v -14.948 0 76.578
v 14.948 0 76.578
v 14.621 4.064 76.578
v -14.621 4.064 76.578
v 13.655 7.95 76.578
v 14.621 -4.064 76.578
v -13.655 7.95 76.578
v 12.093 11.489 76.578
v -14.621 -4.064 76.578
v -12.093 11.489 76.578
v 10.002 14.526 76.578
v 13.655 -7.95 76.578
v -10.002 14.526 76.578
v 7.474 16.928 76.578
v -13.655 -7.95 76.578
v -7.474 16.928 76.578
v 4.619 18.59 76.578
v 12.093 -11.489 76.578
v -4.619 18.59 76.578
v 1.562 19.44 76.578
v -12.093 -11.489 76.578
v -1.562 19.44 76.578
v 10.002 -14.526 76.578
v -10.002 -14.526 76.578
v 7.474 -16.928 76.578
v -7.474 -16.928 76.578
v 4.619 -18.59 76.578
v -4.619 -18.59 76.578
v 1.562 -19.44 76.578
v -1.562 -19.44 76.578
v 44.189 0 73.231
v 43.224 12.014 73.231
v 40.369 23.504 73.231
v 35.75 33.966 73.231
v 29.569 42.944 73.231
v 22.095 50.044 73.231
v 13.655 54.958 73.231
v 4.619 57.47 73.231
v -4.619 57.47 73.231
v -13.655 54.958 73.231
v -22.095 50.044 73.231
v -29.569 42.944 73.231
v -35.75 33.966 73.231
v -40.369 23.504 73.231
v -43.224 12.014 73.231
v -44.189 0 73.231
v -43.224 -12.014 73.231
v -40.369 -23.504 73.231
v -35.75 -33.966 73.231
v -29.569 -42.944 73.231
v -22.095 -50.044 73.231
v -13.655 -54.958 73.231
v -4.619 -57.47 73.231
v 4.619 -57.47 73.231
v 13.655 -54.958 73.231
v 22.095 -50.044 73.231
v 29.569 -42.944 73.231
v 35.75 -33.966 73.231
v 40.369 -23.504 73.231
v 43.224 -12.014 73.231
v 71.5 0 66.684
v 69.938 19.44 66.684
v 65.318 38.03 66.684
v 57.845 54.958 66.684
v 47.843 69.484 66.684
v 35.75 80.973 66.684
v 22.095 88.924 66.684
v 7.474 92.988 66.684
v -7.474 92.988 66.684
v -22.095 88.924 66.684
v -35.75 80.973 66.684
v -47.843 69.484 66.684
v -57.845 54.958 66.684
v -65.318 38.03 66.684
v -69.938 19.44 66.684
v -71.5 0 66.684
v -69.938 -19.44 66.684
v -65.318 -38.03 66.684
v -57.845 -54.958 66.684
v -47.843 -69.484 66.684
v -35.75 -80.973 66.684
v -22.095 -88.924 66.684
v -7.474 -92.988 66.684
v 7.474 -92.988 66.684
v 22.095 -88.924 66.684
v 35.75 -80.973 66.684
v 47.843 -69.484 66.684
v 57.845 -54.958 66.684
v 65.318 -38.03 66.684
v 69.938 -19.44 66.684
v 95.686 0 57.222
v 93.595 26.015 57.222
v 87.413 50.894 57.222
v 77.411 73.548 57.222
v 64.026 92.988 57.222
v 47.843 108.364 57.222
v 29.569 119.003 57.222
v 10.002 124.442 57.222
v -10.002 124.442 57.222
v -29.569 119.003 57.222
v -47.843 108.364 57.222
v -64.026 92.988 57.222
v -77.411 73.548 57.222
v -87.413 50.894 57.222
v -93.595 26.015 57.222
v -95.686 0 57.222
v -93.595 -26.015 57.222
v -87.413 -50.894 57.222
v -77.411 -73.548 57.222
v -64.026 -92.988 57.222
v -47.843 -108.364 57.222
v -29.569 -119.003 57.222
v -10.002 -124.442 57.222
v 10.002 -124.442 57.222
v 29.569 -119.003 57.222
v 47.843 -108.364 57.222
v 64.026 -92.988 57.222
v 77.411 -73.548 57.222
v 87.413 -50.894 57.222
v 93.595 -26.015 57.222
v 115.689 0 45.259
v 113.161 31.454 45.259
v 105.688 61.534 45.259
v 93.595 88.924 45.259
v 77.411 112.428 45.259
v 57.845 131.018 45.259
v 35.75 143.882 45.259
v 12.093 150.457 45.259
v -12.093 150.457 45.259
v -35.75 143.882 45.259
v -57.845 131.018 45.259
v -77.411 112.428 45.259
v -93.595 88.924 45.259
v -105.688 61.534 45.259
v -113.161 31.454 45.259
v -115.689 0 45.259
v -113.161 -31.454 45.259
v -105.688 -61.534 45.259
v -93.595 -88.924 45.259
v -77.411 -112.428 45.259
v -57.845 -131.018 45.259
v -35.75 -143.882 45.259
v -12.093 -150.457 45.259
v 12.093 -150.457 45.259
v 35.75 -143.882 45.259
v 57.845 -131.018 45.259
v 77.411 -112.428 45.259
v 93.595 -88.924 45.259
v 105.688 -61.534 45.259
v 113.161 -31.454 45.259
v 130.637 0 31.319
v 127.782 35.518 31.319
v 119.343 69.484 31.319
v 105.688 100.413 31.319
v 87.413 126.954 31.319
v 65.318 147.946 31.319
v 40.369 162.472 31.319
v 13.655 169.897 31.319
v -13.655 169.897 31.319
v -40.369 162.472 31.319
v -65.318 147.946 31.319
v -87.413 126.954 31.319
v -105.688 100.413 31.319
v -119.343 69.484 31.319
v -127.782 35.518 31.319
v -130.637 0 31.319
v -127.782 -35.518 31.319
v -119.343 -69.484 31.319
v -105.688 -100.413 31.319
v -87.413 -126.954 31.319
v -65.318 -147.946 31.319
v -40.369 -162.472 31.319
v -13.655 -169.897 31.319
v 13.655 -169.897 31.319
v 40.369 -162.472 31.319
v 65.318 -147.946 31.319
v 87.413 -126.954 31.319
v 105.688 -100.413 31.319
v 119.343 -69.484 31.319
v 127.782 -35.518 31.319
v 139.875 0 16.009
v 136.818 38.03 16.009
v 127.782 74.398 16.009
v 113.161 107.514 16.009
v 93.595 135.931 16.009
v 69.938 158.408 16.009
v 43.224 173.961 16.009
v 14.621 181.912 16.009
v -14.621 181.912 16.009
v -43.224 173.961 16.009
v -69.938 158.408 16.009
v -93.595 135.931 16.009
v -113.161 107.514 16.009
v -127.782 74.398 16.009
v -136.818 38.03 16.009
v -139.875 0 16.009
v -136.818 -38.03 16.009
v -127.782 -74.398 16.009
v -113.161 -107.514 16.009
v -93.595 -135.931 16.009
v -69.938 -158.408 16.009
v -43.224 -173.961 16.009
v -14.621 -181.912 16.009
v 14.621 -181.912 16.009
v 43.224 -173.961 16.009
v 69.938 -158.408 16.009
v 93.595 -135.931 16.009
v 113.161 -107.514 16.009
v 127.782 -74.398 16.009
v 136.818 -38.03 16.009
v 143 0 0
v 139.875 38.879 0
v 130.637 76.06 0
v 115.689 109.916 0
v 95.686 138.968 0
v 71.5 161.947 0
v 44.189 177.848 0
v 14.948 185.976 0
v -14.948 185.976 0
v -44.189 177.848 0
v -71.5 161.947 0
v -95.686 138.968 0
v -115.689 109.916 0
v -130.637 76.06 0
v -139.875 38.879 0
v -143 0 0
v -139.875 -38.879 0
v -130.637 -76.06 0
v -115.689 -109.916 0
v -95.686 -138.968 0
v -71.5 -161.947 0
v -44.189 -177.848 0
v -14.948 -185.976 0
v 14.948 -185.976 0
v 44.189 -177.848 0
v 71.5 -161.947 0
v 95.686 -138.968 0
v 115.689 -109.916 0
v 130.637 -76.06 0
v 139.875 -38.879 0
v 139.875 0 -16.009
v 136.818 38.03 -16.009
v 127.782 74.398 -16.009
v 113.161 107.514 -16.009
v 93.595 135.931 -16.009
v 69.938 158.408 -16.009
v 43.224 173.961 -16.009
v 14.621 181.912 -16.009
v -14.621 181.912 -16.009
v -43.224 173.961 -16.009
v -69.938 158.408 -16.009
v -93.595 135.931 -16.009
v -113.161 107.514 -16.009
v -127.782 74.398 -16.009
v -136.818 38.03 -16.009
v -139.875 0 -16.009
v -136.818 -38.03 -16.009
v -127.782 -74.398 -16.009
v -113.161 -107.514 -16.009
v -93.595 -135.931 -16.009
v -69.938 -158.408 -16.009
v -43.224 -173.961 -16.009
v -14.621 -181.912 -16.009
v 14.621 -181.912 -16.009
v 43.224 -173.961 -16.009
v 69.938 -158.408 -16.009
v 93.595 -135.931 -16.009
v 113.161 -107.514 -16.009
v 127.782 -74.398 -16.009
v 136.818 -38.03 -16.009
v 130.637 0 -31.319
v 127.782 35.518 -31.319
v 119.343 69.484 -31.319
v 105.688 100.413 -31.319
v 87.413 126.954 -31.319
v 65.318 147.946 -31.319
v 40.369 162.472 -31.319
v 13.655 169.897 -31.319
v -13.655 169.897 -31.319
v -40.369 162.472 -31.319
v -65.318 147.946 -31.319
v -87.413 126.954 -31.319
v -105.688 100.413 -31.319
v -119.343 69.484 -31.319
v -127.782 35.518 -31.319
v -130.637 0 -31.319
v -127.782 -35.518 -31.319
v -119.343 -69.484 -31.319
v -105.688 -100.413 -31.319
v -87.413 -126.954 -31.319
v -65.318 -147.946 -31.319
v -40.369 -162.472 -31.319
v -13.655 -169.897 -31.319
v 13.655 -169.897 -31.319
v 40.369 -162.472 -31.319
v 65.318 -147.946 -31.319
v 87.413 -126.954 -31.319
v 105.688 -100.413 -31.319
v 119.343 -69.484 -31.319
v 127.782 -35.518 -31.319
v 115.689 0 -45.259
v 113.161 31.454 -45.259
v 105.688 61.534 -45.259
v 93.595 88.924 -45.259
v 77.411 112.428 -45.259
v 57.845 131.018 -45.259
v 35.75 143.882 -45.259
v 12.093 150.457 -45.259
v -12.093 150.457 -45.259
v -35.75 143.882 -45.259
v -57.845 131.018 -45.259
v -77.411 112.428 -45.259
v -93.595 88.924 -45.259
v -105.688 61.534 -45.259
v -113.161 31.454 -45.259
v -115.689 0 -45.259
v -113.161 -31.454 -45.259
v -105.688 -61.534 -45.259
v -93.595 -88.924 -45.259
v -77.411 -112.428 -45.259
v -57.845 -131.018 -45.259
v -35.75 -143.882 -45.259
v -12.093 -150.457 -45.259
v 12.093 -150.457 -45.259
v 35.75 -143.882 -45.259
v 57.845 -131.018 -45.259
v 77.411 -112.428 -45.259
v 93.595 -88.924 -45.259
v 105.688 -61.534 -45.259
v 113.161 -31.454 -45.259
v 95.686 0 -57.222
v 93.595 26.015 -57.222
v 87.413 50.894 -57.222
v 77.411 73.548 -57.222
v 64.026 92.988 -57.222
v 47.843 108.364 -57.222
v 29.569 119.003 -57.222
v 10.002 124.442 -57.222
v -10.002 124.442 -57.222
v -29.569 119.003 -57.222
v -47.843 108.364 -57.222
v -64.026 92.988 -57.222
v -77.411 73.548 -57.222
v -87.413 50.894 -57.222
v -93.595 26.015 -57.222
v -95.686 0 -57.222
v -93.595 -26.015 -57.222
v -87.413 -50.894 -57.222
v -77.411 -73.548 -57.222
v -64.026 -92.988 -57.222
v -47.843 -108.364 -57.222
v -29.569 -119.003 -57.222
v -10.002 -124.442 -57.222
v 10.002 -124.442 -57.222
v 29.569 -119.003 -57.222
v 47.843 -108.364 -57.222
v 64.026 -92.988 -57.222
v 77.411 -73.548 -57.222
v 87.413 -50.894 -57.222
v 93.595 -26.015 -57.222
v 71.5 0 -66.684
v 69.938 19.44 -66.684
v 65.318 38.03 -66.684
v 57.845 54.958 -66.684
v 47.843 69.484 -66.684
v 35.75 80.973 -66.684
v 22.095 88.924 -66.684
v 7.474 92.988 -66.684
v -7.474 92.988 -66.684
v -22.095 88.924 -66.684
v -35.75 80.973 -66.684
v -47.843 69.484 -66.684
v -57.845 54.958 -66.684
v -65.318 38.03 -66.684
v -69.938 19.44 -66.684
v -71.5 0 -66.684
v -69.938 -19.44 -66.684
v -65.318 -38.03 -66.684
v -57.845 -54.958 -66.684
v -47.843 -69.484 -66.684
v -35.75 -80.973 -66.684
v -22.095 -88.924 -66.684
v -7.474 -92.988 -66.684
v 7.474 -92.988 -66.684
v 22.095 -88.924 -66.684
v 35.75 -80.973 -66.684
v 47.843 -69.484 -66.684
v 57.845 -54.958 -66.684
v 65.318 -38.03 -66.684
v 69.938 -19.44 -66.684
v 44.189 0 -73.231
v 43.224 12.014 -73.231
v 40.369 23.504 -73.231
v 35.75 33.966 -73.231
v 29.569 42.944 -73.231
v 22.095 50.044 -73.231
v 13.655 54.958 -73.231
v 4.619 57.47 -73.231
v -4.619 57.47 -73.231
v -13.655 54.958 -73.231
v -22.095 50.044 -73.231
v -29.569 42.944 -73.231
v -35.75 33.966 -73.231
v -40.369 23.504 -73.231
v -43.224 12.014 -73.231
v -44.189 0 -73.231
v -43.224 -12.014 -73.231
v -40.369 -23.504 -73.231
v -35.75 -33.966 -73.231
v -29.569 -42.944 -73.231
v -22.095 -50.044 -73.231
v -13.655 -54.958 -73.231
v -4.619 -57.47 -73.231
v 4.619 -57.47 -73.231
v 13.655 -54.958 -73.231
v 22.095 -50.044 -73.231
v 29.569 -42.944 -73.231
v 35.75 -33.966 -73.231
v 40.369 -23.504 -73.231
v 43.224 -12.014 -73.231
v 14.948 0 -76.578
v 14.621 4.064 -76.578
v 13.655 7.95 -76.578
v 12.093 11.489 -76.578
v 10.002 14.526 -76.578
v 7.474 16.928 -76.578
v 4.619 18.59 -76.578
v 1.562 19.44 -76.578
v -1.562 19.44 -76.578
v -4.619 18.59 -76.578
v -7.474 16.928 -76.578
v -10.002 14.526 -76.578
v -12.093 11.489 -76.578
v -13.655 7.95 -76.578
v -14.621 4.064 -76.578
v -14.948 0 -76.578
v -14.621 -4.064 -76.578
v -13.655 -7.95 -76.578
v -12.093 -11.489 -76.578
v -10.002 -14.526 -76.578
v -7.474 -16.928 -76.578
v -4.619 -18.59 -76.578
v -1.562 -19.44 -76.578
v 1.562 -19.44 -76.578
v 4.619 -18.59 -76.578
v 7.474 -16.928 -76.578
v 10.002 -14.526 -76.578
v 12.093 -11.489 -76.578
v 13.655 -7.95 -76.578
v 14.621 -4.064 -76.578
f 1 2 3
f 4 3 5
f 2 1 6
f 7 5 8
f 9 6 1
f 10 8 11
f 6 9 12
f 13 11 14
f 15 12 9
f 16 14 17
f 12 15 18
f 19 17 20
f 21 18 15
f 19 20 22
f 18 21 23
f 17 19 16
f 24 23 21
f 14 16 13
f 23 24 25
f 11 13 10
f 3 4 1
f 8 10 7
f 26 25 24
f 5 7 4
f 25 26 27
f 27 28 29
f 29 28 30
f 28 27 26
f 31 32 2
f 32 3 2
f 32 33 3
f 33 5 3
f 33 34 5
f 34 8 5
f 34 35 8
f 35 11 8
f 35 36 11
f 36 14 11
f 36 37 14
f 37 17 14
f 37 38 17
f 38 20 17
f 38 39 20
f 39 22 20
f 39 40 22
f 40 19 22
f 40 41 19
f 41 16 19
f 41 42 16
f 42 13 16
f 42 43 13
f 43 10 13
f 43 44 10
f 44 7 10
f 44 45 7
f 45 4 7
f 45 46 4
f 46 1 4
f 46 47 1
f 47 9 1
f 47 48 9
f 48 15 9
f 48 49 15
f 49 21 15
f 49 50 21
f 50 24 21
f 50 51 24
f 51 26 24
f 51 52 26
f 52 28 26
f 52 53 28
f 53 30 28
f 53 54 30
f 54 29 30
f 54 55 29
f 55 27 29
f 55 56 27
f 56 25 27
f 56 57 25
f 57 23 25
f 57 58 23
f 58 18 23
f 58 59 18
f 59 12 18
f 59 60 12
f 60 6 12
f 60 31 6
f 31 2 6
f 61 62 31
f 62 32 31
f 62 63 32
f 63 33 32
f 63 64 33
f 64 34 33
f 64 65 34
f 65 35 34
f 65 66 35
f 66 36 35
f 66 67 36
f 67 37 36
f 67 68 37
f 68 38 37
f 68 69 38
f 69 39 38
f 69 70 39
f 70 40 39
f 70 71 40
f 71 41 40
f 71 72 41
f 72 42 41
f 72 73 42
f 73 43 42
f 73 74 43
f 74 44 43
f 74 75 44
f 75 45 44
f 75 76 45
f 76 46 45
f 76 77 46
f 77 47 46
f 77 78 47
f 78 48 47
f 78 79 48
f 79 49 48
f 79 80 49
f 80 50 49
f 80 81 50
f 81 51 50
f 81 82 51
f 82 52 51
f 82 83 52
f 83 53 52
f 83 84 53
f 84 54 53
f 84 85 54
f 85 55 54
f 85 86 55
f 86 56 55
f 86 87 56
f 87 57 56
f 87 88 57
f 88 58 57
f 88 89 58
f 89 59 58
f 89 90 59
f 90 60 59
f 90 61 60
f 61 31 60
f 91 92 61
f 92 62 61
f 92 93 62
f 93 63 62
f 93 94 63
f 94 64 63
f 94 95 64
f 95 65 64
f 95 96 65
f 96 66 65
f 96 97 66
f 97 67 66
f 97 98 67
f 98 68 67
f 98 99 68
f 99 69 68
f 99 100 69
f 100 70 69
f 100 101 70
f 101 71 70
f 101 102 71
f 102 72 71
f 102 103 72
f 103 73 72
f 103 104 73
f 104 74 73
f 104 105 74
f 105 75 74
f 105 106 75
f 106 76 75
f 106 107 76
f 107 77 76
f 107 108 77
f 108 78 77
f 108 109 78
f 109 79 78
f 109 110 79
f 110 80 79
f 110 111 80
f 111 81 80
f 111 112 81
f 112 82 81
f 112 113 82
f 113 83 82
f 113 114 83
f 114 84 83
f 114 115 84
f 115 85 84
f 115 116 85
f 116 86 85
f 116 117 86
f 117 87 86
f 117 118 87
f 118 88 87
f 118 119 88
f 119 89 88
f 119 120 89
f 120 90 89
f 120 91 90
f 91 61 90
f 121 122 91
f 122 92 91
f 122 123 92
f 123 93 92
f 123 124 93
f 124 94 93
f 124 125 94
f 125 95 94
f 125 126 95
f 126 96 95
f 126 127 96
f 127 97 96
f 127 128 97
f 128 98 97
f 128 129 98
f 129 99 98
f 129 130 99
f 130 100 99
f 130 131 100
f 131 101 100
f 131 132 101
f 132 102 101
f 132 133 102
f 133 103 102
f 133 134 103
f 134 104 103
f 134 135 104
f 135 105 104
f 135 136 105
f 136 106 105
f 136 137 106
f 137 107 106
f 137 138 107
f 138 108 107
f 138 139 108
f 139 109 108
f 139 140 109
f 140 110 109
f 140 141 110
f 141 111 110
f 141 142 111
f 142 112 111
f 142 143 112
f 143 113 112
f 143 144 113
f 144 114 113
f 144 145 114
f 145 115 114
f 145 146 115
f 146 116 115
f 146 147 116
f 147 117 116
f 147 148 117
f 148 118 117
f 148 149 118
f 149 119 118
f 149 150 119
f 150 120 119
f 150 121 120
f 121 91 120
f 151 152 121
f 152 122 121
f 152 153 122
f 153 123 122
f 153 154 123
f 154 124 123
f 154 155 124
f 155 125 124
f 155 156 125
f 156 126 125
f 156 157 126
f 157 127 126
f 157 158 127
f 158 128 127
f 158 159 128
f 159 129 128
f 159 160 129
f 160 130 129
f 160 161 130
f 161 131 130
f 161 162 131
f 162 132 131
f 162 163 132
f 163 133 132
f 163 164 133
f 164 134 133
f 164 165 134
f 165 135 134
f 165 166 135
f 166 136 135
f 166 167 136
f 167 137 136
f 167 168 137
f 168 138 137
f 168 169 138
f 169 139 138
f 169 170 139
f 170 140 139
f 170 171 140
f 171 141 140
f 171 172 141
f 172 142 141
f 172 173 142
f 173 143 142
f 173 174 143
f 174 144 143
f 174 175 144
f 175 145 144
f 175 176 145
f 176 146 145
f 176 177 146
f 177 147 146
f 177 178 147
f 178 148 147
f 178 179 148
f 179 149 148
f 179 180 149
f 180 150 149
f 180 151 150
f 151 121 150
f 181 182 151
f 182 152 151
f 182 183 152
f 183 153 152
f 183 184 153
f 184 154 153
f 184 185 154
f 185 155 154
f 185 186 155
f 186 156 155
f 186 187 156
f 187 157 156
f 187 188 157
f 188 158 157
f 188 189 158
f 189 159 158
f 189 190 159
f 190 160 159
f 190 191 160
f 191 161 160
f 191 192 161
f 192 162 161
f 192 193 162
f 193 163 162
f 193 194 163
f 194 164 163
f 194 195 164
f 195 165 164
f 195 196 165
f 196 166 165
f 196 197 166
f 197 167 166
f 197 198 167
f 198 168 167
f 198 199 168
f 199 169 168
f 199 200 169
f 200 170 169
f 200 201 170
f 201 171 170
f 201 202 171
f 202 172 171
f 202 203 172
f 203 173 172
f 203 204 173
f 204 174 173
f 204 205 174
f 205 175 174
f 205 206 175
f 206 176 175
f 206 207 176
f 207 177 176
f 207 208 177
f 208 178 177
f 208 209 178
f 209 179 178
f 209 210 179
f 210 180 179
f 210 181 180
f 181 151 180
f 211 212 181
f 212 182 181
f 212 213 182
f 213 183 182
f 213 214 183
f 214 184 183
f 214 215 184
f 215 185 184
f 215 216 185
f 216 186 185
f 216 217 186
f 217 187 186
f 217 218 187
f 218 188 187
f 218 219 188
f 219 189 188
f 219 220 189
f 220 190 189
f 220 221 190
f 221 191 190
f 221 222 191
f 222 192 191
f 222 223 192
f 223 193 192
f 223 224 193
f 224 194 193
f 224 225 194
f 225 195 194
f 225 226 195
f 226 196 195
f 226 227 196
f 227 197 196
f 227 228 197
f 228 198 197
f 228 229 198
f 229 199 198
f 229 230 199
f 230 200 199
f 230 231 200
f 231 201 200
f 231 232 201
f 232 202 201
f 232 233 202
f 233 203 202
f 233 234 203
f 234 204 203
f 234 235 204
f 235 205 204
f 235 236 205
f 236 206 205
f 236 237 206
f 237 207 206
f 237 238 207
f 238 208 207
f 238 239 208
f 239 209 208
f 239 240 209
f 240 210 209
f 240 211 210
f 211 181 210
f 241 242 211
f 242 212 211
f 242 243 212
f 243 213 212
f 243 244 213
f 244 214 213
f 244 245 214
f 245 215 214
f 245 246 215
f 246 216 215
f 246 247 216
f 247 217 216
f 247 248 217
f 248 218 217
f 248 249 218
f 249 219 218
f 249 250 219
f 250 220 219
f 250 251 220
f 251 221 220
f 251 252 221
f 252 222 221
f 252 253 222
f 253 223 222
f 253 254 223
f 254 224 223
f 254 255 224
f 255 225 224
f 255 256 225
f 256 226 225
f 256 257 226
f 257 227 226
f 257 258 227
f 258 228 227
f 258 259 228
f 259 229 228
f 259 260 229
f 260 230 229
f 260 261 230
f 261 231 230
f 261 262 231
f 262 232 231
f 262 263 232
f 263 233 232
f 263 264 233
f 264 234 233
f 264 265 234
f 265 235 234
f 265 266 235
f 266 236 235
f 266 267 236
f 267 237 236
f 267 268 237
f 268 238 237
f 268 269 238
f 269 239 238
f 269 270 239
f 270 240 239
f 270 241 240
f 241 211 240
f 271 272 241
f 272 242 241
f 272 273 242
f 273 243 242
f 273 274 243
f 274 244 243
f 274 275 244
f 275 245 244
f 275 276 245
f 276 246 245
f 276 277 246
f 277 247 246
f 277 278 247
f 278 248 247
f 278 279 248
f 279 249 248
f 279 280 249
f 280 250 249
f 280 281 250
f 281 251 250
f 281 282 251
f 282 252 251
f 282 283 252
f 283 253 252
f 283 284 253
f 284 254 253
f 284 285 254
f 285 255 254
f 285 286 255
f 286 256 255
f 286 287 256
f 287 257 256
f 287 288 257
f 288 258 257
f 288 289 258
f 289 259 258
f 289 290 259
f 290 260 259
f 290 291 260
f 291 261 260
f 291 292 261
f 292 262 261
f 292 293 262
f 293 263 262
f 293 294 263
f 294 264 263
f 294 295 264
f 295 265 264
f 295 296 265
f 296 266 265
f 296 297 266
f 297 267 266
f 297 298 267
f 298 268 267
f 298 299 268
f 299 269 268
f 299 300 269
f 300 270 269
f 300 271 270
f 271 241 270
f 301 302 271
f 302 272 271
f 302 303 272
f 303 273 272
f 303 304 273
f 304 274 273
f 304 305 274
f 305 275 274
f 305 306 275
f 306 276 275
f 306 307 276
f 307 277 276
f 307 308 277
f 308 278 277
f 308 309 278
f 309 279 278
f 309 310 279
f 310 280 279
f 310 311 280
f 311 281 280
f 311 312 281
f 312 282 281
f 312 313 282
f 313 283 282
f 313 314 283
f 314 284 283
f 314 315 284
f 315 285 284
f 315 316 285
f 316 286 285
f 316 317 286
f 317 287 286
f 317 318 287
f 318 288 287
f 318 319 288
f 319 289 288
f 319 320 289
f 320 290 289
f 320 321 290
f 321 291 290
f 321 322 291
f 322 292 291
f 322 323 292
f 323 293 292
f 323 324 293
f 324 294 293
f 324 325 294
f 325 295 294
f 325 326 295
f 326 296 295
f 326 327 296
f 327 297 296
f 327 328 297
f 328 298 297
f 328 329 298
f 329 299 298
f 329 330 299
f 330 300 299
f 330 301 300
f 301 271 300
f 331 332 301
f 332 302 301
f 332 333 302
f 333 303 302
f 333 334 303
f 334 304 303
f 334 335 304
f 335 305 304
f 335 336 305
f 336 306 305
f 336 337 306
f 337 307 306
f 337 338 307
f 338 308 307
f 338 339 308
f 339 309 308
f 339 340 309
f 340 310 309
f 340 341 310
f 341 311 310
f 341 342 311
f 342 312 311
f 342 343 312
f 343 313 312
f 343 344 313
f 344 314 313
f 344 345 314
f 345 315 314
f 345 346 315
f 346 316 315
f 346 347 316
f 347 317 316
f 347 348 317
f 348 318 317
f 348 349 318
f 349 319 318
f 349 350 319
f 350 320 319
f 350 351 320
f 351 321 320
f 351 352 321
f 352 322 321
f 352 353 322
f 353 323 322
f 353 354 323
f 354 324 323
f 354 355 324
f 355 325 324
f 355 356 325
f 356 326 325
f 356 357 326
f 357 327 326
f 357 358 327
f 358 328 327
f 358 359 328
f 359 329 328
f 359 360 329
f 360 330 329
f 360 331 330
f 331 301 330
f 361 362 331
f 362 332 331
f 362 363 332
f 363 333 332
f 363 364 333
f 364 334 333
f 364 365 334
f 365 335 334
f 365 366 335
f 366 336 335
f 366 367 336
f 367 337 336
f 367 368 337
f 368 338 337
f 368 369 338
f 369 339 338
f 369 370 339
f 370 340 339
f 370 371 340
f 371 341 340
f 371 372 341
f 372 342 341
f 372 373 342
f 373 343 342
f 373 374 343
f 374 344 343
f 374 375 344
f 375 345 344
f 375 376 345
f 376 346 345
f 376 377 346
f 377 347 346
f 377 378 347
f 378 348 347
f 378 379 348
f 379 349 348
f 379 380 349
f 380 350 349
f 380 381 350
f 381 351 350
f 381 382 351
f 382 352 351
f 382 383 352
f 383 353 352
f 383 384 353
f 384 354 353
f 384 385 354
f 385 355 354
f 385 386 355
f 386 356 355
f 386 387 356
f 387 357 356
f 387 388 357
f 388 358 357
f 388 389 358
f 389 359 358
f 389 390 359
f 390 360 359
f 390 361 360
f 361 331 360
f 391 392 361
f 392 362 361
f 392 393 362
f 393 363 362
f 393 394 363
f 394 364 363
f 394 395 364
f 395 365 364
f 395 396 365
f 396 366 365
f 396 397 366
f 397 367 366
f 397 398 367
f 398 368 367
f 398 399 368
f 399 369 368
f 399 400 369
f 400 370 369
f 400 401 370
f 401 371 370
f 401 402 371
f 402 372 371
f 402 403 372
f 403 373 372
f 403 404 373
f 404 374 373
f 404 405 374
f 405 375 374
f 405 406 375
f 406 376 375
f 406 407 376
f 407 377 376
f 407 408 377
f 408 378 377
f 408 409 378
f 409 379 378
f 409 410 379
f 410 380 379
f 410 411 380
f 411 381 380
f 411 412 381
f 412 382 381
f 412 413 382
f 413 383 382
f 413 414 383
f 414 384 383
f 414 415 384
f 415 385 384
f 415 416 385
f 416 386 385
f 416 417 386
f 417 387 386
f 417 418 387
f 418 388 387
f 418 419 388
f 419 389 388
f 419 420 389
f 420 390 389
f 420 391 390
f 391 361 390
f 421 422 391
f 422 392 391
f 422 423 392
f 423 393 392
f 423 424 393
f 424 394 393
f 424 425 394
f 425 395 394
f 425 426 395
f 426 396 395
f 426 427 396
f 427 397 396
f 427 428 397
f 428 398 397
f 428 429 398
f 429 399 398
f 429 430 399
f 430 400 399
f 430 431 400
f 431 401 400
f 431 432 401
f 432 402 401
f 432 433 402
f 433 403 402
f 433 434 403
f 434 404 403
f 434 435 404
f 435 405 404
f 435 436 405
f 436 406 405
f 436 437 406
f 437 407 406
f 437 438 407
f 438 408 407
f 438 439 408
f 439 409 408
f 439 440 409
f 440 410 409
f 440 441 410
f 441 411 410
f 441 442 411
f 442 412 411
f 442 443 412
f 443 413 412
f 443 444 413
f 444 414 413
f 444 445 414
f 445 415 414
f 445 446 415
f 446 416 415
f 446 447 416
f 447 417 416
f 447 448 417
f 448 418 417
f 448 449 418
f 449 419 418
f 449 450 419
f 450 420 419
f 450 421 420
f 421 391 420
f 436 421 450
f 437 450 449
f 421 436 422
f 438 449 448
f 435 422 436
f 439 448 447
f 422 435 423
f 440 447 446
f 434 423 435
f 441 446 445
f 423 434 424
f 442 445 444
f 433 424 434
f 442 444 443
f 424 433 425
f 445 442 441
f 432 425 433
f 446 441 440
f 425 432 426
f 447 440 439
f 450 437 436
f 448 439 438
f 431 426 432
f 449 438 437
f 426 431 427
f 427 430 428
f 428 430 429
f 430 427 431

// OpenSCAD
// Generated by SolidPython 1.0.1 on 2020-07-29 00:46:51


scale(v = [13, 17, 7]) {
	sphere(r = 11);
}
/***********************************************
*********      SolidPython code:      **********
************************************************
 
# import packages: SolidPython
from solid import *
from solid.utils import *
from itertools import chain, combinations, permutations


class Resize:

    def __init__(self, scad_file):
        self.scad_file = scad_file
        #self.scad_file = import_scad(scad_file)
        # cone/cylinder param:
        self.r1 = 0
        self.r2 = 0
        self.h = 0
        # rectangular prism param:
        self.w = 0
        self.l = 0
        # ellipse param:
        self.r = 0

    # import OpenScad code (file name corresponds to shape)


    # classify shape + parameters
    def assign(self, param1, param2, param3):
        if self.scad_file == 'cone.scad':
            self.r1 = param1
            self.r2 = param2
            self.h = param3
        elif self.scad_file == 'cylinder.scad':
            self.r1 = param1
            self.r2 = param2
            self.h = param3
        elif self.scad_file == 'rectangularPrism.scad':
            self.h = param1
            self.l = param2
            self.w = param3
        else:
            self.r = param1
            self.h = param2

    # resize parameters
    def iterate(self):
        x = range(3, 20, 2)
        i = 1
        if self.scad_file == 'cone.scad':
            tempList = list(permutations(x, 2))
            for temp in tempList:
                param1 = temp[0]
                param2 = temp[1]
                filepath = 'produced_scad_files/' + 'cone' + str(param1) + '_' + str(param2) + '_' + '.scad'
                scad_render_to_file(cylinder(h=param1, r1=param2, r2=0), filepath)

        elif self.scad_file == 'cylinder.scad':
            tempList = list(permutations(x, 3))
            for temp in tempList:
                param1 = temp[0]
                param2 = temp[1]
                filepath = 'produced_scad_files/' + 'cylinder' + str(param1) + '_' + str(param2) + '_' + '.scad'
                scad_render_to_file(cylinder(h=param1, r1=param2, r2=param2), filepath)

        elif self.scad_file == 'rectangularPrism.scad':
            tempList = list(permutations(x, 3))
            for temp in tempList:
                param1 = temp[0]
                param2 = temp[1]
                param3 = temp[2]
                filepath = 'produced_scad_files/' + 'rectangularPrism' + str(param1) + '_' + str(param2) + '_' + str(
                    param3) + '.scad'
                scad_render_to_file(cube(size=(param1, param2, param3)), filepath)

        elif self.scad_file == 'ellipse.scad':
            tempList = list(permutations(x, 4))
            for temp in tempList:
                param1 = temp[0]
                param2 = temp[1]
                param3 = temp[2]
                param4 = temp[3]
                filepath = 'produced_scad_files/' + 'ellipse' + str(param1) + '_' + str(param2) + '_' + str(param3) + '_' + str(param4) + '.scad'
                scad_render_to_file(scale([param1, param2, param3])(sphere(r=param4)), filepath)

    def render_to_scadfile(self):
        scad_render_to_file(scad, 'example.scad') 
 
************************************************/
